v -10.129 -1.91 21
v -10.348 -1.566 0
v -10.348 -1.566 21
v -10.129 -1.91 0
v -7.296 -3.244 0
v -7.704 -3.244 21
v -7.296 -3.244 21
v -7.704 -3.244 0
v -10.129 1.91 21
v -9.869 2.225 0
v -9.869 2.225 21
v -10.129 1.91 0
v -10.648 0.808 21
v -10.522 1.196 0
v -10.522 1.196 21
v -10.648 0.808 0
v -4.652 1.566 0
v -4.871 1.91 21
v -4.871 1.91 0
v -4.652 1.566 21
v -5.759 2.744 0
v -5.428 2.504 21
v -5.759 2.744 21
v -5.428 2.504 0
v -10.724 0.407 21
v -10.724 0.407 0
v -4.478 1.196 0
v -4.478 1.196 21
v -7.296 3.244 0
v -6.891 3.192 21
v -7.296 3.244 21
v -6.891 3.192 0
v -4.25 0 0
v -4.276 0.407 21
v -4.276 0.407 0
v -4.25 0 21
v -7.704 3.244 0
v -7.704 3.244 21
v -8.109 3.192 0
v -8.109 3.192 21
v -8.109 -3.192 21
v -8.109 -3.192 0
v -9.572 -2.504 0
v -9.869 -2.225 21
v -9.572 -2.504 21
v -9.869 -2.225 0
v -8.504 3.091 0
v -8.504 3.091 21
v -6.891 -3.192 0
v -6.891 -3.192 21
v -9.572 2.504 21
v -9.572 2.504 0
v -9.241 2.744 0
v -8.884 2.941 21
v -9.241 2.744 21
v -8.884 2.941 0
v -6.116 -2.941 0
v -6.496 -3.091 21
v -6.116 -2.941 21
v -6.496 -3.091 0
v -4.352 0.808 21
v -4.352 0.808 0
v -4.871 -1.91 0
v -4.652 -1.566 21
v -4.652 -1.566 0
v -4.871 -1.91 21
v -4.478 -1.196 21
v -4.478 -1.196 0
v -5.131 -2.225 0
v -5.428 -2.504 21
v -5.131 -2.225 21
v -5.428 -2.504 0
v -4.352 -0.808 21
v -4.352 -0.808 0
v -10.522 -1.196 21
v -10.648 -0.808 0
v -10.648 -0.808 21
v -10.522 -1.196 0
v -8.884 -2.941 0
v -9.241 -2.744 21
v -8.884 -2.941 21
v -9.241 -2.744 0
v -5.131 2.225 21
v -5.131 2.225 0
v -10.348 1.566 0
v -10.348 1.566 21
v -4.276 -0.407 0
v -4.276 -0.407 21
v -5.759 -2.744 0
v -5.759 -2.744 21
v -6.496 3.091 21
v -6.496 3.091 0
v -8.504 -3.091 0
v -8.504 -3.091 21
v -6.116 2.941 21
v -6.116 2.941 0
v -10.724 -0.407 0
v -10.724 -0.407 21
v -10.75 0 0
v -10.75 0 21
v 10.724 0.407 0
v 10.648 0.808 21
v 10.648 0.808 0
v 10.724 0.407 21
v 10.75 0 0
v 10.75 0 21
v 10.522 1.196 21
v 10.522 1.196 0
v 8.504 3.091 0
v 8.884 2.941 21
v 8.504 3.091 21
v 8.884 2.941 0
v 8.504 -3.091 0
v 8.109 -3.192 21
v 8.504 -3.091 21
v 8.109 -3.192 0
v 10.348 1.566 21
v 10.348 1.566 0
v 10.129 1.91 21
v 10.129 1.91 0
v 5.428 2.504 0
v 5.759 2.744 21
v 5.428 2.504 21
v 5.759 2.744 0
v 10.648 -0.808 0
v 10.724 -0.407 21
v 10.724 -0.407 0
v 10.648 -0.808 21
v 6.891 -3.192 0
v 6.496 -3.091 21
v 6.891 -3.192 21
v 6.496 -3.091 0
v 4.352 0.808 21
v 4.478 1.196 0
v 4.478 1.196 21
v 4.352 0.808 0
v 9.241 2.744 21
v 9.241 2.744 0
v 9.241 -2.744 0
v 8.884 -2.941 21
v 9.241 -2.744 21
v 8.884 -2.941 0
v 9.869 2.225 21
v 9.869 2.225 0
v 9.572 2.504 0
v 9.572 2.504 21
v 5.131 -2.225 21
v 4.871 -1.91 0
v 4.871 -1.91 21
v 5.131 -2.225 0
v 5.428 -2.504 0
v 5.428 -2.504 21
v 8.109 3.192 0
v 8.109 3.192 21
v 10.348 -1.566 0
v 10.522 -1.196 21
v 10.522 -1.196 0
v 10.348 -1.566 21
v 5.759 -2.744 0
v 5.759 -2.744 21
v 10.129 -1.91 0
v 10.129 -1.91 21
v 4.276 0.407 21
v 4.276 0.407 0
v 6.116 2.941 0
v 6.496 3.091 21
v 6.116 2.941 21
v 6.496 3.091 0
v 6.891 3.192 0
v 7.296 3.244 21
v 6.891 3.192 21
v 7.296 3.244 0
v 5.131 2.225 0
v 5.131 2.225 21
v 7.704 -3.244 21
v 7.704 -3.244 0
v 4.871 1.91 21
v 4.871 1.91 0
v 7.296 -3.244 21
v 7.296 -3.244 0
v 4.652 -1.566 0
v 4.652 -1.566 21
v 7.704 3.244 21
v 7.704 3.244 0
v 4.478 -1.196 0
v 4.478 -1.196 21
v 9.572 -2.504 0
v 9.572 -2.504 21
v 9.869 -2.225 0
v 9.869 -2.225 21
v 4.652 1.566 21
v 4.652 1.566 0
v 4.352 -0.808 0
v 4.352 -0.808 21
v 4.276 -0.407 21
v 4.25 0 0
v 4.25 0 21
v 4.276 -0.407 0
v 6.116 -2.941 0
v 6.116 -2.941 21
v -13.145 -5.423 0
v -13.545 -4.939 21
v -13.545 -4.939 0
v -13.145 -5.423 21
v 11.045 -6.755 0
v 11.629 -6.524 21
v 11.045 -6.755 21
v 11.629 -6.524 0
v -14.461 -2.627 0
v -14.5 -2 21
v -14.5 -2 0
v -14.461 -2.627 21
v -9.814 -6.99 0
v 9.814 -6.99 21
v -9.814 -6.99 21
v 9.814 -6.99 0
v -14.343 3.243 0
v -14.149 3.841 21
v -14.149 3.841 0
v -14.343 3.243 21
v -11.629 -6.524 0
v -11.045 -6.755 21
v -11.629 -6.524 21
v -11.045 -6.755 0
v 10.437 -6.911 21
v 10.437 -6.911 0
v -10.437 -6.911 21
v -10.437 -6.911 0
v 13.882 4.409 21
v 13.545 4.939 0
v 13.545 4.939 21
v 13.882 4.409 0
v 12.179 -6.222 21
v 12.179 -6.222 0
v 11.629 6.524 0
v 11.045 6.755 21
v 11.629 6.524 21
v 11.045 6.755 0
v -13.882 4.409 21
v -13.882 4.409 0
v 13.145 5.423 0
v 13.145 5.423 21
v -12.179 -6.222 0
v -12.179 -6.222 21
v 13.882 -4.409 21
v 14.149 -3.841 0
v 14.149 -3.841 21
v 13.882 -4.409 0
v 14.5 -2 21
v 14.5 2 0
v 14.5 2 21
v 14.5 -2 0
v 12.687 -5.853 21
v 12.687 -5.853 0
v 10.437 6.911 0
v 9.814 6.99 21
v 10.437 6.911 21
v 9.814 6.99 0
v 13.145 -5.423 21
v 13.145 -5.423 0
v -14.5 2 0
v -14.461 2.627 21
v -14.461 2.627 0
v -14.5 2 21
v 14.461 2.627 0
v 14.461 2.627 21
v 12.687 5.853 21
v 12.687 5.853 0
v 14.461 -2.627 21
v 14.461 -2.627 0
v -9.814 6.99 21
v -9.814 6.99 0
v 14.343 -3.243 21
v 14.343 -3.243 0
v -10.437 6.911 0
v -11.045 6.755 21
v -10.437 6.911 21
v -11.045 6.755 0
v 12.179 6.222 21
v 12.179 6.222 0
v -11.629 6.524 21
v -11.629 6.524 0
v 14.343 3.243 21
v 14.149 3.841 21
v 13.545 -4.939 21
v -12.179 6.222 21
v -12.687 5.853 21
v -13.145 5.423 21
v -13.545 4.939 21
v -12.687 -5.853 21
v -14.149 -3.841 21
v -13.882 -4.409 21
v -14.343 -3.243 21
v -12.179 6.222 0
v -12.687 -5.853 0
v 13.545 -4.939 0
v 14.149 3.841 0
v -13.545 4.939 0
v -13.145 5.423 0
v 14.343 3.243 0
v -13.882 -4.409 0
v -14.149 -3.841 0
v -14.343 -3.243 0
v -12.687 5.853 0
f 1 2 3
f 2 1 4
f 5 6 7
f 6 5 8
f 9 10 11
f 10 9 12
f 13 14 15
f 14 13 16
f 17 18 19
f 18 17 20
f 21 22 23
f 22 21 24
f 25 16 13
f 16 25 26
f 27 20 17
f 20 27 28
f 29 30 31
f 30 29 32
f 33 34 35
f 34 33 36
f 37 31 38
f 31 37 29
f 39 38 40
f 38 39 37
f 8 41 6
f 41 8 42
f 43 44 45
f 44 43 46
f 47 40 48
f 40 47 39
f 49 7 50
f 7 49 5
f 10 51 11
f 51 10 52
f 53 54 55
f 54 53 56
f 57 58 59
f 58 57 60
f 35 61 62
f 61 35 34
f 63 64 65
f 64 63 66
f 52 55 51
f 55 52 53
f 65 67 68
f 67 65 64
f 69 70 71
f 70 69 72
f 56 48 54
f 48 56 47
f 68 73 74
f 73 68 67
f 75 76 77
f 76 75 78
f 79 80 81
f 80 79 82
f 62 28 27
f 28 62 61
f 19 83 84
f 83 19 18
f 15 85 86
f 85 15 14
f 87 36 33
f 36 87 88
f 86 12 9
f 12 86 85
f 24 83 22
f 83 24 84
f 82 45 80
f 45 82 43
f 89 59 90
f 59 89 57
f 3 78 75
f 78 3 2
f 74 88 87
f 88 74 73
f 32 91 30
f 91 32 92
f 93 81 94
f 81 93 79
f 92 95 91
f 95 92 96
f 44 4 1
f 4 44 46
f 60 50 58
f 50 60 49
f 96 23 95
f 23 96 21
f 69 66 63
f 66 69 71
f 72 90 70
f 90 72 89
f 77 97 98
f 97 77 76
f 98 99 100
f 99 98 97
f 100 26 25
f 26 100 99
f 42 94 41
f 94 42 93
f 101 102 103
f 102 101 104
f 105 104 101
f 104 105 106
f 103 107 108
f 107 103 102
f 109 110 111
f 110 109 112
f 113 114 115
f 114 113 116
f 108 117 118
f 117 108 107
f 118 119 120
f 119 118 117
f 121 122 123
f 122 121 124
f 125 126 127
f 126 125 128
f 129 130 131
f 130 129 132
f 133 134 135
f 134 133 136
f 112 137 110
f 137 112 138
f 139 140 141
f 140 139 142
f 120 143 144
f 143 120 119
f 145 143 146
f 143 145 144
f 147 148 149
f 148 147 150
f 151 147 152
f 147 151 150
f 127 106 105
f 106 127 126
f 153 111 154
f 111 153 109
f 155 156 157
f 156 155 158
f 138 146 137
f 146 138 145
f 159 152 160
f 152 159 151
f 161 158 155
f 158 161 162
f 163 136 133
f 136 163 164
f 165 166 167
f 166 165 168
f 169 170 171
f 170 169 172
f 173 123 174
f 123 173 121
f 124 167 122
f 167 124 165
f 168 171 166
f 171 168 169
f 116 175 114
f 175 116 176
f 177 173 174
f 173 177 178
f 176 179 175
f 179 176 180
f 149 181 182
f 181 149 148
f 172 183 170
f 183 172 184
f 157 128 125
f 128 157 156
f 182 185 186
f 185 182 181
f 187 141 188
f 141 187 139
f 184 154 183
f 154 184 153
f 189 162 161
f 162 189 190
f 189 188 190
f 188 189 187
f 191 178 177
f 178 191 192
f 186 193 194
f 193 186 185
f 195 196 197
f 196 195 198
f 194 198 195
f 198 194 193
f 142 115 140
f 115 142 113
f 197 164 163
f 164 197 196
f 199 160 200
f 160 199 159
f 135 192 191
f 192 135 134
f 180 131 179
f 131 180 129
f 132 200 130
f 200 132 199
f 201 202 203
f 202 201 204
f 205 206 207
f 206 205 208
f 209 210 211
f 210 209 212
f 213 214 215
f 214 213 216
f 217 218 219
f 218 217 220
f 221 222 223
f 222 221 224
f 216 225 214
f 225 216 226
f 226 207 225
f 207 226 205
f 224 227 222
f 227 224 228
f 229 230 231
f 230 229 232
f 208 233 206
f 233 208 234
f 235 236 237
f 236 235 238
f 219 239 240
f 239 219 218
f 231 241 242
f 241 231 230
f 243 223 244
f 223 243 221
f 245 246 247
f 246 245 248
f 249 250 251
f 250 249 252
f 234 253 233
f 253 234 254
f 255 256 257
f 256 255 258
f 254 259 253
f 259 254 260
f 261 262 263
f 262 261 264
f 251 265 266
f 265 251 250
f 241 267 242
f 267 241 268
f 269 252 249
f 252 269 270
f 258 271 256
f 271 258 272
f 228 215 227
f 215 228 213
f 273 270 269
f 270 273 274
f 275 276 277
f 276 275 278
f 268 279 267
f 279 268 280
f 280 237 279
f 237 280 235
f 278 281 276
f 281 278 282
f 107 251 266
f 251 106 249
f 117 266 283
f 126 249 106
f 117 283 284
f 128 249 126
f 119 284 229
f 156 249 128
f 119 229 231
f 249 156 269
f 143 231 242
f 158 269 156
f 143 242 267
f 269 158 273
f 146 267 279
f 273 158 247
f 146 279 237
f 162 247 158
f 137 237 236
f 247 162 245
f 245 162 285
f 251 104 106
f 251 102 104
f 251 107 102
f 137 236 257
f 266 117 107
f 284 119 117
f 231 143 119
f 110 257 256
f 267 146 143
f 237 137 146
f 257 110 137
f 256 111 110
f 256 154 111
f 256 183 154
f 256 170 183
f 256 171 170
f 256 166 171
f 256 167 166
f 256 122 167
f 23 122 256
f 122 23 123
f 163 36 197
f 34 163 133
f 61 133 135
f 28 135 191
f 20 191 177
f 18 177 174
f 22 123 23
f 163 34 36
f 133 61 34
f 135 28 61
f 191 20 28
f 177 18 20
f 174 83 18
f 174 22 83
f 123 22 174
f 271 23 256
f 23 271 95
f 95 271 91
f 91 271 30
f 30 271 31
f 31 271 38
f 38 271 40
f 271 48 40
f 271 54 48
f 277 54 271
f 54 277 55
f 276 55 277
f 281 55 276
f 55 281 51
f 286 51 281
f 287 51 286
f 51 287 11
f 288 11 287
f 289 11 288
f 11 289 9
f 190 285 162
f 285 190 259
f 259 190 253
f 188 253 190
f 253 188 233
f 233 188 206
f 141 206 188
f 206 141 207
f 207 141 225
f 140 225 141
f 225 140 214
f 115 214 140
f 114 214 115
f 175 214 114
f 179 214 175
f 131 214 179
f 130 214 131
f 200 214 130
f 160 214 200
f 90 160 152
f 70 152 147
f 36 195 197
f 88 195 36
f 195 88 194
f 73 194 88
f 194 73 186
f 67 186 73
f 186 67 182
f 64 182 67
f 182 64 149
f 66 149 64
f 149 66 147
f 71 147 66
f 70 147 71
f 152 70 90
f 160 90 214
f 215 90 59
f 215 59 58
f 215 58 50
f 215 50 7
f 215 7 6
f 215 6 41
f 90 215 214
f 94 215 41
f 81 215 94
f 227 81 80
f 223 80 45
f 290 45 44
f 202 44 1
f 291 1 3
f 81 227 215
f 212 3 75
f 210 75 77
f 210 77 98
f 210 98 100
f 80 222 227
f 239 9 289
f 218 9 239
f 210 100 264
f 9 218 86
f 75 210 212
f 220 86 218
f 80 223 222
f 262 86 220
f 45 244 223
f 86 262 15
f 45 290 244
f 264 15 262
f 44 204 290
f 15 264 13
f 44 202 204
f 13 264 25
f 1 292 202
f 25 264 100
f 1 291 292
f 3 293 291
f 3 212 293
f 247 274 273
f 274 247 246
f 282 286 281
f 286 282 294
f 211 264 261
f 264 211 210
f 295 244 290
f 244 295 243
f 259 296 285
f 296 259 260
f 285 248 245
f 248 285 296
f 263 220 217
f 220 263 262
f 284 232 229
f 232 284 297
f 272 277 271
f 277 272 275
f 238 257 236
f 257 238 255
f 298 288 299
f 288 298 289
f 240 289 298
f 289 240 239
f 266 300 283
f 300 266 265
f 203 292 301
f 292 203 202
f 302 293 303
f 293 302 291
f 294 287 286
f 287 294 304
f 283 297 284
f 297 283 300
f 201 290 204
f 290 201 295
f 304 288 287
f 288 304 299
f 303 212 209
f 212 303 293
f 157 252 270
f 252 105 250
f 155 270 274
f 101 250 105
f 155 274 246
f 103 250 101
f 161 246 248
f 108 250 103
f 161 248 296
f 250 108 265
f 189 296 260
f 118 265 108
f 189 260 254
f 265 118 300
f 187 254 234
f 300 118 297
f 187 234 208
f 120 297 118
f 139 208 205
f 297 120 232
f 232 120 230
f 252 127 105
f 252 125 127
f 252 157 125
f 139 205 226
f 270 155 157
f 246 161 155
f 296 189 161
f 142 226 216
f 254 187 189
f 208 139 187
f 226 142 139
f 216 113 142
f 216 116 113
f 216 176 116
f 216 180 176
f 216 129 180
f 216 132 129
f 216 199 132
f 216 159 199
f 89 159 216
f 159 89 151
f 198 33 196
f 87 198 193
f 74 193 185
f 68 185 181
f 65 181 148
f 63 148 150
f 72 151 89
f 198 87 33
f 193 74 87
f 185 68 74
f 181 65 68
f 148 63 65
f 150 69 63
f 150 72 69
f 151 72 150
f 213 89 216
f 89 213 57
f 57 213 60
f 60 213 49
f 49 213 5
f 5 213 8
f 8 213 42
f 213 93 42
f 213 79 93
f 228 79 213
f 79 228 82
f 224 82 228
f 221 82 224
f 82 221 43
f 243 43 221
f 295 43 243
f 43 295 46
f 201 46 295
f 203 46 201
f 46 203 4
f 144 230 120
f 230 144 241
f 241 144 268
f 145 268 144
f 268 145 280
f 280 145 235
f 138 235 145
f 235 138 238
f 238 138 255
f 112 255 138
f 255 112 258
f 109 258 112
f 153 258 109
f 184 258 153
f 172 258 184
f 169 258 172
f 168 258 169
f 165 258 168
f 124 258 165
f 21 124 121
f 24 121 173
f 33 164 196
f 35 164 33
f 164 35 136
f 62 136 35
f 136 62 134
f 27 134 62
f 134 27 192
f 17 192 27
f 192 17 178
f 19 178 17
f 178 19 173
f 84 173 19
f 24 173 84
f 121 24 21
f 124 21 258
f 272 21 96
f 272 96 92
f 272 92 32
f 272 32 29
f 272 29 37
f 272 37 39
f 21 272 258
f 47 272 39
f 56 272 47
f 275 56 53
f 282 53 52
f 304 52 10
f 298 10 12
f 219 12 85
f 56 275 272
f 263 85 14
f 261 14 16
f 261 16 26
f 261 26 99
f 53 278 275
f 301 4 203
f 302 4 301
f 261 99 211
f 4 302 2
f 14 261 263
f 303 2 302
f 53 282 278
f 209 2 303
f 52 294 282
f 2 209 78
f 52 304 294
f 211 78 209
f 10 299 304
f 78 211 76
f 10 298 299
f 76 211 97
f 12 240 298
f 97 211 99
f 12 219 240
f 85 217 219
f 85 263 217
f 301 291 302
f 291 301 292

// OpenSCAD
$fn = 50;


difference() {
	union() {
		hull() {
			translate(v = [-9.5000000000, 2.0000000000, 0]) {
				cylinder(h = 21, r = 5);
			}
			translate(v = [9.5000000000, 2.0000000000, 0]) {
				cylinder(h = 21, r = 5);
			}
			translate(v = [-9.5000000000, -2.0000000000, 0]) {
				cylinder(h = 21, r = 5);
			}
			translate(v = [9.5000000000, -2.0000000000, 0]) {
				cylinder(h = 21, r = 5);
			}
		}
	}
	union() {
		translate(v = [-7.5000000000, 0.0000000000, 0]) {
			translate(v = [0, 0, -100]) {
				cylinder(h = 200, r = 3.2500000000);
			}
		}
		translate(v = [7.5000000000, 0.0000000000, 0]) {
			translate(v = [0, 0, -100]) {
				cylinder(h = 200, r = 3.2500000000);
			}
		}
	}
}
